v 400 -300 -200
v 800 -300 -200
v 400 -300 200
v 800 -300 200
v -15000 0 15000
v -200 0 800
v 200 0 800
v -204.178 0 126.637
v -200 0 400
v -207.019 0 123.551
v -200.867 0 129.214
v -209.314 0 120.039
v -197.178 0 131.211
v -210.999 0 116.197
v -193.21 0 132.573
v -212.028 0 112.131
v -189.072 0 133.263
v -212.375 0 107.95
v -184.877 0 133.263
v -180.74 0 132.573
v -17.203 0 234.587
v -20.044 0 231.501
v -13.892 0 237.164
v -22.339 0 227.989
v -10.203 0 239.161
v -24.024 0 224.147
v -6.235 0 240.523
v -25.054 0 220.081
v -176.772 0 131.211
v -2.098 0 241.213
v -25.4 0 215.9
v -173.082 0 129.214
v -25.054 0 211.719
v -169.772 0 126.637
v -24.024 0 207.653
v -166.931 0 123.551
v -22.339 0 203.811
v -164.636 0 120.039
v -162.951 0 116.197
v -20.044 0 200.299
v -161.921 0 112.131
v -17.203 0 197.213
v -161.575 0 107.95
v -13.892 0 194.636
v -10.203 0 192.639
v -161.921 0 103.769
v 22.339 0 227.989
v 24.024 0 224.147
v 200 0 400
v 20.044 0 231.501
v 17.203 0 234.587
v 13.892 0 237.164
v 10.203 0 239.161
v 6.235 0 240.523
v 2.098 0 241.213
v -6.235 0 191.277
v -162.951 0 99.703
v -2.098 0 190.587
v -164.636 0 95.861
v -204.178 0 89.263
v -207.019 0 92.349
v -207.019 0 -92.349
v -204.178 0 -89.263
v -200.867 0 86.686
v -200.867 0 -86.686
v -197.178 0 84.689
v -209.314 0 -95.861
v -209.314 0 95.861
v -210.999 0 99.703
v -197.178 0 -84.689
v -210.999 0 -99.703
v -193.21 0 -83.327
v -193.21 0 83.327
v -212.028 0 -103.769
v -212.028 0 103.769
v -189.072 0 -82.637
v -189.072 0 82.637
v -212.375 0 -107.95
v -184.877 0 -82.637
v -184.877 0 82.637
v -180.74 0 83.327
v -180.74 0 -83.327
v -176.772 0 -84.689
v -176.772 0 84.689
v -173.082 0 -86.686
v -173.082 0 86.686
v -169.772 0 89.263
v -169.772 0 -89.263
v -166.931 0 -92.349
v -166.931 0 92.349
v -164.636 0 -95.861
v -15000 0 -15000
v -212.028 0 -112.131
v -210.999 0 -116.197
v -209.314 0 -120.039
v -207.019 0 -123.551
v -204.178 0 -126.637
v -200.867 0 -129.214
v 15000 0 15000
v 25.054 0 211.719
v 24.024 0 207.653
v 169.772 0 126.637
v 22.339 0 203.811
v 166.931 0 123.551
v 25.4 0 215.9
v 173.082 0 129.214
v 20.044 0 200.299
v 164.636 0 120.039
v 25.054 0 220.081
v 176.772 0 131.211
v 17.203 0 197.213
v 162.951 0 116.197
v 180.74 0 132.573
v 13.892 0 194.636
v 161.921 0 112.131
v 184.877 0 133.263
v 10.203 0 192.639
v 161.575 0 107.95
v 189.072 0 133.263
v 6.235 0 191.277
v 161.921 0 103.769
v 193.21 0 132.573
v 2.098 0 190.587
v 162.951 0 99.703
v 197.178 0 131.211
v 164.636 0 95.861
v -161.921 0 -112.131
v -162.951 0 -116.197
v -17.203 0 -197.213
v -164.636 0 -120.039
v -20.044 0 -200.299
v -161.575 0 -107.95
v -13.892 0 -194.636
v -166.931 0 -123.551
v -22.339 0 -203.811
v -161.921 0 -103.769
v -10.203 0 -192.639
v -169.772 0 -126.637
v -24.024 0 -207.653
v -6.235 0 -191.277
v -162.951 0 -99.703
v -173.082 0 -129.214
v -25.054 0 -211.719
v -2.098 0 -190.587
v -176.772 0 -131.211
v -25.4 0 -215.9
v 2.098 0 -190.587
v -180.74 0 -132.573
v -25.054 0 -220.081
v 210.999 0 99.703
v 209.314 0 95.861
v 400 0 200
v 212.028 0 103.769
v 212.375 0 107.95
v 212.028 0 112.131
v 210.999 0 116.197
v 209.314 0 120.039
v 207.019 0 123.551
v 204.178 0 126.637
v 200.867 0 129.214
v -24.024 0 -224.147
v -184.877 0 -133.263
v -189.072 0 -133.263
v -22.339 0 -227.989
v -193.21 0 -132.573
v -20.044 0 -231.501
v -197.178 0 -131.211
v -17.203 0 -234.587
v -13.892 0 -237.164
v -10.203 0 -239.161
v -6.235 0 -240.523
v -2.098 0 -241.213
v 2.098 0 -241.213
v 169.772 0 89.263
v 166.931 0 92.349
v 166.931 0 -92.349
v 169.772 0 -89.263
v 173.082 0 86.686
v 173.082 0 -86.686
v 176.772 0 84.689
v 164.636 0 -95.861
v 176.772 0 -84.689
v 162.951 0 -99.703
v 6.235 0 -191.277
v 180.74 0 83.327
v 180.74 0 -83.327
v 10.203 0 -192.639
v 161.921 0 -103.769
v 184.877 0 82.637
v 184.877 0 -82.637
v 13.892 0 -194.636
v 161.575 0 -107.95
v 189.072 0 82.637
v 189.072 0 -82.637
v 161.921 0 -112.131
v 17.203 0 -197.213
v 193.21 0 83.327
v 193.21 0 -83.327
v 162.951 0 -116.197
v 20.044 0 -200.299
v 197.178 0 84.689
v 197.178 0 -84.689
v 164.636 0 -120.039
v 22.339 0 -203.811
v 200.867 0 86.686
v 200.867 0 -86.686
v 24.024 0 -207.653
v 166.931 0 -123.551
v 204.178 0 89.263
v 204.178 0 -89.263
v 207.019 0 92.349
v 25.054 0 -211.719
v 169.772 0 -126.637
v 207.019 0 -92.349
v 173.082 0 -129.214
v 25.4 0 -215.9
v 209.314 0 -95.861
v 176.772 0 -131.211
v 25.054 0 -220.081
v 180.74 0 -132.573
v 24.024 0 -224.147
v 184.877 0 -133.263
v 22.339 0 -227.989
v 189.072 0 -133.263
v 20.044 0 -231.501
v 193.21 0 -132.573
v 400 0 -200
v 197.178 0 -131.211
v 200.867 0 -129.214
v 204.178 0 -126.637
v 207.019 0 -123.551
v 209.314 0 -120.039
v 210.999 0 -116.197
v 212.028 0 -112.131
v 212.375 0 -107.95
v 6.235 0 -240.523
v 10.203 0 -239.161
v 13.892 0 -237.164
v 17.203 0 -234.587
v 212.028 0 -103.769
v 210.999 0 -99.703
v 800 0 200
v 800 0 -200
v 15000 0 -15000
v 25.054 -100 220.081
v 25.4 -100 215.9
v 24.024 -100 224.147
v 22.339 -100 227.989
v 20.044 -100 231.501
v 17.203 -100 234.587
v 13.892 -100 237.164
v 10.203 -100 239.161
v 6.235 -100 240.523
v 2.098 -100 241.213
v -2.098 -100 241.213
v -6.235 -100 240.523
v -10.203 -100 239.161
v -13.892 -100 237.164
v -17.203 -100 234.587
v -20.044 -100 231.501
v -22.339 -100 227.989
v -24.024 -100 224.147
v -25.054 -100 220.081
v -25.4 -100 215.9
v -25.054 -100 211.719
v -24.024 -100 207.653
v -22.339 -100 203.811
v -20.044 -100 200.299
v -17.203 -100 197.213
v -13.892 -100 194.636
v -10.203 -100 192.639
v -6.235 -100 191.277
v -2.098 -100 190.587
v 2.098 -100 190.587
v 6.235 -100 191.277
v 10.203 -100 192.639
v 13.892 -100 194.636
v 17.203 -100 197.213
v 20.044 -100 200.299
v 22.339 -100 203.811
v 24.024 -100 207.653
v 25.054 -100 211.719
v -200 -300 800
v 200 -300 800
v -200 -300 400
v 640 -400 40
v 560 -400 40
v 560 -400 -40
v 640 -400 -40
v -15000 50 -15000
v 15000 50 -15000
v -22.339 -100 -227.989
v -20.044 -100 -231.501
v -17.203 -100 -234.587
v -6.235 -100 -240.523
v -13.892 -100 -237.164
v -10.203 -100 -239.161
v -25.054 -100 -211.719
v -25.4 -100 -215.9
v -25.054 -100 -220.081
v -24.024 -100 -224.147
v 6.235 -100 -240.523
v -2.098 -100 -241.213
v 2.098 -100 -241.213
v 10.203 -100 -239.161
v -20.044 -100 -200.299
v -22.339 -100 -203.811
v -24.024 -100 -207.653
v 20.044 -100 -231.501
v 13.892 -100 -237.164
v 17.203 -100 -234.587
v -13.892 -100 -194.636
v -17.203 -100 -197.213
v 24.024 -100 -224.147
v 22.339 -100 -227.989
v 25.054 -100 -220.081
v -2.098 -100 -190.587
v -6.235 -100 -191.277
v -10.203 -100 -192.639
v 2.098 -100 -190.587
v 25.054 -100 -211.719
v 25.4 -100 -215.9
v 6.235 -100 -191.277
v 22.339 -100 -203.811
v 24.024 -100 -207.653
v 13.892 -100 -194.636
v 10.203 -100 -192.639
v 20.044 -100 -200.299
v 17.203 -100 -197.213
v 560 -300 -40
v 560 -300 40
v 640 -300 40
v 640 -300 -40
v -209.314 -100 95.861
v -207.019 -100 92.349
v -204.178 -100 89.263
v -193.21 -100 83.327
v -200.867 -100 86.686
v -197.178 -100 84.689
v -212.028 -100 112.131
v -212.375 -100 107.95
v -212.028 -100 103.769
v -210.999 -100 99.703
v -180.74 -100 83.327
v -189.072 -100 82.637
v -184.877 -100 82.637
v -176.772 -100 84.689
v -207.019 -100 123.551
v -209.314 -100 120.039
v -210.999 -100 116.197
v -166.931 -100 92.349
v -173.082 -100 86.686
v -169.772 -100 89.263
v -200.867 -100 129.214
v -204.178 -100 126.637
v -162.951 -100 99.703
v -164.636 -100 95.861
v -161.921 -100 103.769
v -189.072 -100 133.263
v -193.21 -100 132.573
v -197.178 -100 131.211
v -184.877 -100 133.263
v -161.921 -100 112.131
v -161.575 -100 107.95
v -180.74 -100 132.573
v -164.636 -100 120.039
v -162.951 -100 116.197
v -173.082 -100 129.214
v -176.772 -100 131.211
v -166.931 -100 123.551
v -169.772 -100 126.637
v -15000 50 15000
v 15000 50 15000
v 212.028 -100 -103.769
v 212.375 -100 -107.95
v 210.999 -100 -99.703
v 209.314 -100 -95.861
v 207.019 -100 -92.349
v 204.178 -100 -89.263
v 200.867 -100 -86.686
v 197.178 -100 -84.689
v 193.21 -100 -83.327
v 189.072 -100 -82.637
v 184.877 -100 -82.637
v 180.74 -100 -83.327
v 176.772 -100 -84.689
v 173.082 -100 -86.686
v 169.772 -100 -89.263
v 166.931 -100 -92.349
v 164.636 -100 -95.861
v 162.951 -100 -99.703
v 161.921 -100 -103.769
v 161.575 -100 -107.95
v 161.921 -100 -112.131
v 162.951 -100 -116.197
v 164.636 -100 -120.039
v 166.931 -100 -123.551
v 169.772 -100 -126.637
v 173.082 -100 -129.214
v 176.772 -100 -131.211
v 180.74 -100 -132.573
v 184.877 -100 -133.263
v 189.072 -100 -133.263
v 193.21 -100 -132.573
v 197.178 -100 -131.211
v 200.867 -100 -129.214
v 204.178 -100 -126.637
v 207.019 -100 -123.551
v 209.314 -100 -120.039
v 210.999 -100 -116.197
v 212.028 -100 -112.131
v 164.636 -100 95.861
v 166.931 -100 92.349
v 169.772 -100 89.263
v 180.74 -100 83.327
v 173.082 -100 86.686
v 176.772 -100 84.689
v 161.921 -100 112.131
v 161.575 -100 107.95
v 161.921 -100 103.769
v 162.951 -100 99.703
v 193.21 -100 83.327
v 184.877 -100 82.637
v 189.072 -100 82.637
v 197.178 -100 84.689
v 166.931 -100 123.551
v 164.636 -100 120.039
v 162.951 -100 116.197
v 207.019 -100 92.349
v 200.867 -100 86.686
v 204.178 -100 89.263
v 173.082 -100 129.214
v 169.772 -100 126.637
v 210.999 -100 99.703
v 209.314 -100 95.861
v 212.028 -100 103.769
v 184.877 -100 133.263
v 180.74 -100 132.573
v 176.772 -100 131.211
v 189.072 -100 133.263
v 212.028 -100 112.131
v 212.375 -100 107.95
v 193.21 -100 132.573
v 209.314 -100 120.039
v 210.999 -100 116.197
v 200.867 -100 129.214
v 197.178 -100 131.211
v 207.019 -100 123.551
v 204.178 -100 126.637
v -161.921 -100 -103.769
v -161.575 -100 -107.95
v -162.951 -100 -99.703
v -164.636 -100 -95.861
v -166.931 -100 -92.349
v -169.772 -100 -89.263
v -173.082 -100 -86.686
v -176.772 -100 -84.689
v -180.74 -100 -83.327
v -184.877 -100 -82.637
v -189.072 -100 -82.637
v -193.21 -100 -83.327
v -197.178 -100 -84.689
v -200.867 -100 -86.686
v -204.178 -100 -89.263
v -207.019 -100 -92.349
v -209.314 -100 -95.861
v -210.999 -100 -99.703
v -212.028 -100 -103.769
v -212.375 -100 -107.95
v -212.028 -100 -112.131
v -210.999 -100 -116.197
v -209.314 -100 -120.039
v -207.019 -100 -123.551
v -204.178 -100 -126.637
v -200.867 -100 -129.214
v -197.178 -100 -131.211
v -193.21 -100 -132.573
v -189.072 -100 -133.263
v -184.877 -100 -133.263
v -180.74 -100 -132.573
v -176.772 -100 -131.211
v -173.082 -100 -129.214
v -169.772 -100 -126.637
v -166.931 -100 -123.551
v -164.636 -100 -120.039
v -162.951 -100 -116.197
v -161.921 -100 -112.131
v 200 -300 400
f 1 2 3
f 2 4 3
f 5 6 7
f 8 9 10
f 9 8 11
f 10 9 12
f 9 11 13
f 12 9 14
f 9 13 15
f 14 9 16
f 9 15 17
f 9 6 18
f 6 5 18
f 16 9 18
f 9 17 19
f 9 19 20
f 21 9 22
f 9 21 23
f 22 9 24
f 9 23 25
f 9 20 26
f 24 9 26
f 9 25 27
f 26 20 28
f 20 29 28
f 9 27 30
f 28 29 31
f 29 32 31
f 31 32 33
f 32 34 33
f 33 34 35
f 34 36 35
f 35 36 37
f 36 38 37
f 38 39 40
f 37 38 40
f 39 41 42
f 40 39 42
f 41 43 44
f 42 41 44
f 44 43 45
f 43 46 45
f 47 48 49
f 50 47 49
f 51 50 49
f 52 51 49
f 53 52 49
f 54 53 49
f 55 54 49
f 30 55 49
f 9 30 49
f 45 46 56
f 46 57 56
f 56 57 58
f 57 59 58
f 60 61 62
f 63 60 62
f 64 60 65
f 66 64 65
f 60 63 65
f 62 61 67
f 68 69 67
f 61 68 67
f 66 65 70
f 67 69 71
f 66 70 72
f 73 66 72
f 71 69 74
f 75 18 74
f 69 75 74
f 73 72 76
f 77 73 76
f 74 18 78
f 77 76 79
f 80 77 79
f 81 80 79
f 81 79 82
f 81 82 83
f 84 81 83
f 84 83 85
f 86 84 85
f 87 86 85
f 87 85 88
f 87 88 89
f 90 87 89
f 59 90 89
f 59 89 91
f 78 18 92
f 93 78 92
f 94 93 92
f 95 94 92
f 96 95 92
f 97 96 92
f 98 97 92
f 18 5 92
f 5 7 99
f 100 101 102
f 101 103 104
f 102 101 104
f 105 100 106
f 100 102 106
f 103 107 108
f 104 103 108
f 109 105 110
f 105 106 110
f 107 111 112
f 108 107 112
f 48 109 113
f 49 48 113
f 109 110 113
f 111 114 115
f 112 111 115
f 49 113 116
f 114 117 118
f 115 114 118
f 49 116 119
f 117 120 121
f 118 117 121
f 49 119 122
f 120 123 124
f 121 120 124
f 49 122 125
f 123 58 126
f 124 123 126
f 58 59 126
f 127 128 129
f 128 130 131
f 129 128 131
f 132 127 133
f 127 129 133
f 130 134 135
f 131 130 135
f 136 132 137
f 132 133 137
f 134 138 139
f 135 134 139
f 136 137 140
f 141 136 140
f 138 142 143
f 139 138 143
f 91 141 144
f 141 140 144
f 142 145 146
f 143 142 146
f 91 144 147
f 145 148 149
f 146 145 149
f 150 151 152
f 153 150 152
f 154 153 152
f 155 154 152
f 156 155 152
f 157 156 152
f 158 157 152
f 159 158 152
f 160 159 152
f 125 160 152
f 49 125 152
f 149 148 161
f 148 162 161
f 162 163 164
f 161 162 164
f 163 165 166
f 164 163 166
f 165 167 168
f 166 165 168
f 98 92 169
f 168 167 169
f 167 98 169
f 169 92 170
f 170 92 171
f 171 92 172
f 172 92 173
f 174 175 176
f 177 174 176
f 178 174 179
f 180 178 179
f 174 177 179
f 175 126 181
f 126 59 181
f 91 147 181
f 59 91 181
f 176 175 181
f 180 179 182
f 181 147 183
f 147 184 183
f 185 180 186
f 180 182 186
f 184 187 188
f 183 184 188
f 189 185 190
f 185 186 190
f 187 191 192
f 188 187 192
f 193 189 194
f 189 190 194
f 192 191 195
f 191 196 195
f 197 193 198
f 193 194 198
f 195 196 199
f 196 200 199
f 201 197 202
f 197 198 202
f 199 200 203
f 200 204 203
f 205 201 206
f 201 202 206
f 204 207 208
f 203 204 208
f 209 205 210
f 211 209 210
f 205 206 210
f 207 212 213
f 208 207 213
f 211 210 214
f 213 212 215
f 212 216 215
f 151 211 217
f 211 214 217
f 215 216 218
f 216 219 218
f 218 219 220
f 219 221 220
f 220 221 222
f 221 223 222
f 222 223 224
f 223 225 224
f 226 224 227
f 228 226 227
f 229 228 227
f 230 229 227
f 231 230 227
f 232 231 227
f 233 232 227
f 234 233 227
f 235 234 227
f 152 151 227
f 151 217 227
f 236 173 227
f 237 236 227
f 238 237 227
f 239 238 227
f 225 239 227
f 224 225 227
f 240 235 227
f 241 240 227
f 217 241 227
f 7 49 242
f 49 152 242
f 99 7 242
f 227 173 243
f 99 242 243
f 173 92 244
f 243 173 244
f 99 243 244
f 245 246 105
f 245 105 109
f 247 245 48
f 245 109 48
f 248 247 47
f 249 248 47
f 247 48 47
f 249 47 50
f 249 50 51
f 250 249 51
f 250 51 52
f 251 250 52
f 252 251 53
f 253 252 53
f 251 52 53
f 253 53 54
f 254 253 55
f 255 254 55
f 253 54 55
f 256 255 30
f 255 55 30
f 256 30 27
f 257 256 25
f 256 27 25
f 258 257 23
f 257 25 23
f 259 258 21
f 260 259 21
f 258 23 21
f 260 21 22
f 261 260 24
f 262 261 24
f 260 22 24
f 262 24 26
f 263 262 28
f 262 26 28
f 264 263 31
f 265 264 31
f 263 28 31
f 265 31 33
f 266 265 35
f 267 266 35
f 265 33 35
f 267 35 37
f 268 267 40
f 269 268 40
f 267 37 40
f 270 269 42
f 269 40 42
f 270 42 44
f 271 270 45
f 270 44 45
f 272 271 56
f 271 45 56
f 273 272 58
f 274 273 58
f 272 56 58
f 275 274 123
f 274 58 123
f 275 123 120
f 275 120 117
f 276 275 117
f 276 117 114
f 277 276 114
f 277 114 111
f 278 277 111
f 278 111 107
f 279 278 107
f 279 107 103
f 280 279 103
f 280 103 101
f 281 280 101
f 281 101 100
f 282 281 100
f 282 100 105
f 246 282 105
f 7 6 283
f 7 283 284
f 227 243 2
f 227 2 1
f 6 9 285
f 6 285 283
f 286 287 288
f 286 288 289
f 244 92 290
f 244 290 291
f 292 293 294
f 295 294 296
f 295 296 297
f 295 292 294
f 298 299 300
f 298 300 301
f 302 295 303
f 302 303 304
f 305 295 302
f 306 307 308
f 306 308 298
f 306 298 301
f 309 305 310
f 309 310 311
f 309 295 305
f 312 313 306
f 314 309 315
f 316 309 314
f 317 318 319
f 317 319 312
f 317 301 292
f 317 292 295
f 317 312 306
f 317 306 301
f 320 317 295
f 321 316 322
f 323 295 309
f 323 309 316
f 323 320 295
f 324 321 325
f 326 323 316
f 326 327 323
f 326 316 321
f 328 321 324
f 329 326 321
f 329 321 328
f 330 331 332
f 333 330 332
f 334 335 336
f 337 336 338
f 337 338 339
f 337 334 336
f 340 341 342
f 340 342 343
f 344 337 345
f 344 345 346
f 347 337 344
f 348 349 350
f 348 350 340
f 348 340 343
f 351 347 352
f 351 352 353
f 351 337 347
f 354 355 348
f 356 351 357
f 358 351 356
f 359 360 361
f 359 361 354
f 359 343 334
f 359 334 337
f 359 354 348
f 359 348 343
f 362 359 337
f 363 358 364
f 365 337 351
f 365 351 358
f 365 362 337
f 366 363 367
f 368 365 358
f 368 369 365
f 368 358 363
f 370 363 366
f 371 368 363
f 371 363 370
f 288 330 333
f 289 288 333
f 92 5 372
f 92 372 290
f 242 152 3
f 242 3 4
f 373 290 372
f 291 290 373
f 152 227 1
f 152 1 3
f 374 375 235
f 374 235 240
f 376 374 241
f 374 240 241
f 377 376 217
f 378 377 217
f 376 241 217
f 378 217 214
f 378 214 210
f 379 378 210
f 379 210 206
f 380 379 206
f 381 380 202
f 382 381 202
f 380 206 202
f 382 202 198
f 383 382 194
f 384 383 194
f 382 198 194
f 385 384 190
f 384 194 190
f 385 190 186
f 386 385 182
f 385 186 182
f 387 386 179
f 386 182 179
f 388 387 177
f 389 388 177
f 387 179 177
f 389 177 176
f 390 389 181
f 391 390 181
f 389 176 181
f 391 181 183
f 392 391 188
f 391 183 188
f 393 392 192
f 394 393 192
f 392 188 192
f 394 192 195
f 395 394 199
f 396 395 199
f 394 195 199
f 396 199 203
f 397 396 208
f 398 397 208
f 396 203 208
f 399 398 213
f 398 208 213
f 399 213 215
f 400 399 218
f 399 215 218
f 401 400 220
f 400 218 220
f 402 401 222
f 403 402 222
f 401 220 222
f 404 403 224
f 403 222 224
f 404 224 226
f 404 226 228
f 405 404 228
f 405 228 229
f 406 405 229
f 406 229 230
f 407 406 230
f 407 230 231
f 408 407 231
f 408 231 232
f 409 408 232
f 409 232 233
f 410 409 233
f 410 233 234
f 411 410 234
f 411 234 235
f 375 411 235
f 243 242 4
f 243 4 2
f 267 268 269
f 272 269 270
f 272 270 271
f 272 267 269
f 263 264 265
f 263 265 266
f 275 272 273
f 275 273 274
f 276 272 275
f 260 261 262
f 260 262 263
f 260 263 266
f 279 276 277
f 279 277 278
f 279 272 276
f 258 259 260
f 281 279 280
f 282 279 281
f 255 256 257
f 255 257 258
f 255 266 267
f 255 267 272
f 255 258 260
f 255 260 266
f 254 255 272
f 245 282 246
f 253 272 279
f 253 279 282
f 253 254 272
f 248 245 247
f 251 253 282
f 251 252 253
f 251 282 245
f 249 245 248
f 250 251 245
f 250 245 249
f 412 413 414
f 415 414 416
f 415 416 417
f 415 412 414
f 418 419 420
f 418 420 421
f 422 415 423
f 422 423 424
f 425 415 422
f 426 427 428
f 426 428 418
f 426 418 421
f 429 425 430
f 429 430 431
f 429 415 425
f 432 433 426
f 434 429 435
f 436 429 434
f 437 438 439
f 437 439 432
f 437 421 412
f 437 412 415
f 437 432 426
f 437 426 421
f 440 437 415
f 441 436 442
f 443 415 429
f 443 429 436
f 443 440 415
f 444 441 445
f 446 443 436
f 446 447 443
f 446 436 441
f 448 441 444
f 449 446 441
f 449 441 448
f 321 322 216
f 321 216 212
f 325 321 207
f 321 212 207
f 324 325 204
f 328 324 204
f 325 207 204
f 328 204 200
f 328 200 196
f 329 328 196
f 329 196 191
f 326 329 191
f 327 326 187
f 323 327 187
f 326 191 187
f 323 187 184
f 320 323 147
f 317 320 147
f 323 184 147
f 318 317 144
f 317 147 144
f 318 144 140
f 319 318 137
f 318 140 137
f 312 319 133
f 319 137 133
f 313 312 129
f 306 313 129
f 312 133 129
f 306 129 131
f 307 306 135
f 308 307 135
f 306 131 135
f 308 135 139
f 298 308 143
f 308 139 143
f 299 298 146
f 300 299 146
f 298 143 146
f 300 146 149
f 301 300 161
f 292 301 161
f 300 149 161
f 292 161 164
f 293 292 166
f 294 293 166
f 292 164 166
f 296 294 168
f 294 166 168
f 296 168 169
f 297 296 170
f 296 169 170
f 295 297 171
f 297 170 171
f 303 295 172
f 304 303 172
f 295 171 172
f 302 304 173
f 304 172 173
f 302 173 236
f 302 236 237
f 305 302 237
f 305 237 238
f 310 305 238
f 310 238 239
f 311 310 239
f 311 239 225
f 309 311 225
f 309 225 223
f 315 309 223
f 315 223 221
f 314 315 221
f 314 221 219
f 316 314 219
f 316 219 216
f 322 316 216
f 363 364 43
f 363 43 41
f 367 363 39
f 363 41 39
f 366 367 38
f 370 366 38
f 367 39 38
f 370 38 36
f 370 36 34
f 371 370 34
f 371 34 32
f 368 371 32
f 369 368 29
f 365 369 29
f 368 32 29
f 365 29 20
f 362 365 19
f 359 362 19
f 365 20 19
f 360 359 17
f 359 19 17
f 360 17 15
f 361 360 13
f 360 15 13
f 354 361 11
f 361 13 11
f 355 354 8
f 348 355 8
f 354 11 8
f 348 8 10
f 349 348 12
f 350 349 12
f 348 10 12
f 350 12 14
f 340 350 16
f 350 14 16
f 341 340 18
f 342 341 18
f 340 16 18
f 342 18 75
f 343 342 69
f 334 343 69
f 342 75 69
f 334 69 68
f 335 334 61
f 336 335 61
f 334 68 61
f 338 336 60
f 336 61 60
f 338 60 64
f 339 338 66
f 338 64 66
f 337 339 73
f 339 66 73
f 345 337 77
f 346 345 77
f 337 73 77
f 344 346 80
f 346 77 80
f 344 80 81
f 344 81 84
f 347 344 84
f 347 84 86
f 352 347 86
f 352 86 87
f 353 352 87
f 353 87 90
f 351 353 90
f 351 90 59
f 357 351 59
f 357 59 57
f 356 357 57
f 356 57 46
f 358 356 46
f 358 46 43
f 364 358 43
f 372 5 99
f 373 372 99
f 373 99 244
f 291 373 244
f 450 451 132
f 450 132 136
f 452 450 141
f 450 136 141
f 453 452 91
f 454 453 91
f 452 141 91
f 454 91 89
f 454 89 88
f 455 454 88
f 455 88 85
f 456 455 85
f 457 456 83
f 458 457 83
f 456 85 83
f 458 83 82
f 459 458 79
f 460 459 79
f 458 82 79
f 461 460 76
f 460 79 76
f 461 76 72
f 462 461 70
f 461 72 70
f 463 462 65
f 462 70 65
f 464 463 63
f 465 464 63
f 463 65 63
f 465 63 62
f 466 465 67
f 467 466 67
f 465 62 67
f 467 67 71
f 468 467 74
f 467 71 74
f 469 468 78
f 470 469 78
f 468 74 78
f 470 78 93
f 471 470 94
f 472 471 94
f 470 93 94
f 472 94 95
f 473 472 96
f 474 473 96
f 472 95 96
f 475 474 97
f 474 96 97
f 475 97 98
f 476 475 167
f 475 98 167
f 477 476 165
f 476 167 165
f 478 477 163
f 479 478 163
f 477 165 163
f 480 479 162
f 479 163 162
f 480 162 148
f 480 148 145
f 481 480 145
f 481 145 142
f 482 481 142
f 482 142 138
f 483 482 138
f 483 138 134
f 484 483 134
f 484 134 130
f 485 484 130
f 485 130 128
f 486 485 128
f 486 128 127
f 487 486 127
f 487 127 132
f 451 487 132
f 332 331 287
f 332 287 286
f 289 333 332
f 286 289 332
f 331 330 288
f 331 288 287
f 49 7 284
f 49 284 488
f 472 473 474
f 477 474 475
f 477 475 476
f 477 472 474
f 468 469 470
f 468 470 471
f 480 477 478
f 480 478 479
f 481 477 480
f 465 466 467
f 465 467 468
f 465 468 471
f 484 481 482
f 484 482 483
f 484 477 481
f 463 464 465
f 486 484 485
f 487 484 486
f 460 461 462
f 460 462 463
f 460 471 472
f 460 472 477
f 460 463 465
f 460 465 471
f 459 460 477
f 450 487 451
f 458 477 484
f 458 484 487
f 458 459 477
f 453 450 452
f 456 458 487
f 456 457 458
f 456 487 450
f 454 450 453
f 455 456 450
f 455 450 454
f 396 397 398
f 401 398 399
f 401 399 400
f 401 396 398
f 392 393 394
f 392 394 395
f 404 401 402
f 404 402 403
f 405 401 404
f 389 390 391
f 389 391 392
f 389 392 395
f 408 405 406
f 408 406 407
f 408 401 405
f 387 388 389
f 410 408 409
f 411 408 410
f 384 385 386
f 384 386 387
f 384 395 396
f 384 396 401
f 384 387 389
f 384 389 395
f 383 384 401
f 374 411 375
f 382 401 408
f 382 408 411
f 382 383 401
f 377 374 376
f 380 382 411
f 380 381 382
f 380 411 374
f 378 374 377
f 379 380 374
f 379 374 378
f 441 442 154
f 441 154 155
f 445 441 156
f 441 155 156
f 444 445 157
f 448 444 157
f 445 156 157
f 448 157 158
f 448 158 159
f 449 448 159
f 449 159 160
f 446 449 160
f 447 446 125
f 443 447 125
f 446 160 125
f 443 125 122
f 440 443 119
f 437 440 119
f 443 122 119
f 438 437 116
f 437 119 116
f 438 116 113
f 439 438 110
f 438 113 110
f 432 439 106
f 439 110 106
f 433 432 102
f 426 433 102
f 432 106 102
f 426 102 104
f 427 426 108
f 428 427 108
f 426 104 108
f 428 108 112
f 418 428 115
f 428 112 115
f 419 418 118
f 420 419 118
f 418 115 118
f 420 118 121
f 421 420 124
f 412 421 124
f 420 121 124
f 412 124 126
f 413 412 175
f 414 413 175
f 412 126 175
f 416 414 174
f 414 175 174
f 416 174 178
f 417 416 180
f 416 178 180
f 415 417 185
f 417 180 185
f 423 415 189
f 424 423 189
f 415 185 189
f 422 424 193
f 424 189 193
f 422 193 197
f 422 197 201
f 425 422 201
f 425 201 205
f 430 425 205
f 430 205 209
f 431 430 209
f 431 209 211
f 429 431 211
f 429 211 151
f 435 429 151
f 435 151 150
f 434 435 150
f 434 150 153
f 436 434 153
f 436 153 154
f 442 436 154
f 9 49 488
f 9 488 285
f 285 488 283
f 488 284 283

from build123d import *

# Parameters (mm, degrees)
SKETCH3_W           = 30000
SKETCH3_H           = 30000
BOSS_EXTRUDE2_DEPTH = 50
SKETCH8_R           = 25.4
BOSS_EXTRUDE4_DEPTH = 100
BOSS_EXTRUDE5_DEPTH = 300
SKETCH10_W          = 80
SKETCH10_H          = 80
BOSS_EXTRUDE6_DEPTH = 100


with BuildPart() as part:
    # Sketch3 → Boss-Extrude2 (new body)
    with BuildSketch(Plane(origin=(0, 0, 0), x_dir=(1, 0, 0), z_dir=(0, 1, 0))):
        Rectangle(SKETCH3_W, SKETCH3_H)
    extrude(amount=BOSS_EXTRUDE2_DEPTH)

    # Sketch8 → Boss-Extrude4 (add)
    with BuildSketch(Plane.XZ):
        with Locations((0, 215.9)):
            Circle(SKETCH8_R)
        with Locations((186.974884677, 107.95)):
            Circle(SKETCH8_R)
        with Locations((186.974884677, -107.95)):
            Circle(SKETCH8_R)
        with Locations((0, -215.9)):
            Circle(SKETCH8_R)
        with Locations((-186.974884677, -107.95)):
            Circle(SKETCH8_R)
        with Locations((-186.974884677, 107.95)):
            Circle(SKETCH8_R)
    extrude(amount=BOSS_EXTRUDE4_DEPTH)

    # Sketch9 → Boss-Extrude5 (add)
    with BuildSketch(Plane.XZ):
        Polygon((400, 200), (800, -200), (400, -200), align=None)
        Polygon((400, 200), (800, 200), (800, -200), align=None)
        Polygon((200, 400), (-200, 400), (-200, 800), align=None)
        Polygon((200, 400), (-200, 800), (200, 800), align=None)
    extrude(amount=BOSS_EXTRUDE5_DEPTH)


with BuildPart() as body_2:
    # Sketch10 → Boss-Extrude6 (new body)
    with BuildSketch(Plane.XZ.offset(300)):
        with Locations((600, 0)):
            Rectangle(SKETCH10_W, SKETCH10_H)
    extrude(amount=BOSS_EXTRUDE6_DEPTH)


solid = Compound([part.part, body_2.part])
